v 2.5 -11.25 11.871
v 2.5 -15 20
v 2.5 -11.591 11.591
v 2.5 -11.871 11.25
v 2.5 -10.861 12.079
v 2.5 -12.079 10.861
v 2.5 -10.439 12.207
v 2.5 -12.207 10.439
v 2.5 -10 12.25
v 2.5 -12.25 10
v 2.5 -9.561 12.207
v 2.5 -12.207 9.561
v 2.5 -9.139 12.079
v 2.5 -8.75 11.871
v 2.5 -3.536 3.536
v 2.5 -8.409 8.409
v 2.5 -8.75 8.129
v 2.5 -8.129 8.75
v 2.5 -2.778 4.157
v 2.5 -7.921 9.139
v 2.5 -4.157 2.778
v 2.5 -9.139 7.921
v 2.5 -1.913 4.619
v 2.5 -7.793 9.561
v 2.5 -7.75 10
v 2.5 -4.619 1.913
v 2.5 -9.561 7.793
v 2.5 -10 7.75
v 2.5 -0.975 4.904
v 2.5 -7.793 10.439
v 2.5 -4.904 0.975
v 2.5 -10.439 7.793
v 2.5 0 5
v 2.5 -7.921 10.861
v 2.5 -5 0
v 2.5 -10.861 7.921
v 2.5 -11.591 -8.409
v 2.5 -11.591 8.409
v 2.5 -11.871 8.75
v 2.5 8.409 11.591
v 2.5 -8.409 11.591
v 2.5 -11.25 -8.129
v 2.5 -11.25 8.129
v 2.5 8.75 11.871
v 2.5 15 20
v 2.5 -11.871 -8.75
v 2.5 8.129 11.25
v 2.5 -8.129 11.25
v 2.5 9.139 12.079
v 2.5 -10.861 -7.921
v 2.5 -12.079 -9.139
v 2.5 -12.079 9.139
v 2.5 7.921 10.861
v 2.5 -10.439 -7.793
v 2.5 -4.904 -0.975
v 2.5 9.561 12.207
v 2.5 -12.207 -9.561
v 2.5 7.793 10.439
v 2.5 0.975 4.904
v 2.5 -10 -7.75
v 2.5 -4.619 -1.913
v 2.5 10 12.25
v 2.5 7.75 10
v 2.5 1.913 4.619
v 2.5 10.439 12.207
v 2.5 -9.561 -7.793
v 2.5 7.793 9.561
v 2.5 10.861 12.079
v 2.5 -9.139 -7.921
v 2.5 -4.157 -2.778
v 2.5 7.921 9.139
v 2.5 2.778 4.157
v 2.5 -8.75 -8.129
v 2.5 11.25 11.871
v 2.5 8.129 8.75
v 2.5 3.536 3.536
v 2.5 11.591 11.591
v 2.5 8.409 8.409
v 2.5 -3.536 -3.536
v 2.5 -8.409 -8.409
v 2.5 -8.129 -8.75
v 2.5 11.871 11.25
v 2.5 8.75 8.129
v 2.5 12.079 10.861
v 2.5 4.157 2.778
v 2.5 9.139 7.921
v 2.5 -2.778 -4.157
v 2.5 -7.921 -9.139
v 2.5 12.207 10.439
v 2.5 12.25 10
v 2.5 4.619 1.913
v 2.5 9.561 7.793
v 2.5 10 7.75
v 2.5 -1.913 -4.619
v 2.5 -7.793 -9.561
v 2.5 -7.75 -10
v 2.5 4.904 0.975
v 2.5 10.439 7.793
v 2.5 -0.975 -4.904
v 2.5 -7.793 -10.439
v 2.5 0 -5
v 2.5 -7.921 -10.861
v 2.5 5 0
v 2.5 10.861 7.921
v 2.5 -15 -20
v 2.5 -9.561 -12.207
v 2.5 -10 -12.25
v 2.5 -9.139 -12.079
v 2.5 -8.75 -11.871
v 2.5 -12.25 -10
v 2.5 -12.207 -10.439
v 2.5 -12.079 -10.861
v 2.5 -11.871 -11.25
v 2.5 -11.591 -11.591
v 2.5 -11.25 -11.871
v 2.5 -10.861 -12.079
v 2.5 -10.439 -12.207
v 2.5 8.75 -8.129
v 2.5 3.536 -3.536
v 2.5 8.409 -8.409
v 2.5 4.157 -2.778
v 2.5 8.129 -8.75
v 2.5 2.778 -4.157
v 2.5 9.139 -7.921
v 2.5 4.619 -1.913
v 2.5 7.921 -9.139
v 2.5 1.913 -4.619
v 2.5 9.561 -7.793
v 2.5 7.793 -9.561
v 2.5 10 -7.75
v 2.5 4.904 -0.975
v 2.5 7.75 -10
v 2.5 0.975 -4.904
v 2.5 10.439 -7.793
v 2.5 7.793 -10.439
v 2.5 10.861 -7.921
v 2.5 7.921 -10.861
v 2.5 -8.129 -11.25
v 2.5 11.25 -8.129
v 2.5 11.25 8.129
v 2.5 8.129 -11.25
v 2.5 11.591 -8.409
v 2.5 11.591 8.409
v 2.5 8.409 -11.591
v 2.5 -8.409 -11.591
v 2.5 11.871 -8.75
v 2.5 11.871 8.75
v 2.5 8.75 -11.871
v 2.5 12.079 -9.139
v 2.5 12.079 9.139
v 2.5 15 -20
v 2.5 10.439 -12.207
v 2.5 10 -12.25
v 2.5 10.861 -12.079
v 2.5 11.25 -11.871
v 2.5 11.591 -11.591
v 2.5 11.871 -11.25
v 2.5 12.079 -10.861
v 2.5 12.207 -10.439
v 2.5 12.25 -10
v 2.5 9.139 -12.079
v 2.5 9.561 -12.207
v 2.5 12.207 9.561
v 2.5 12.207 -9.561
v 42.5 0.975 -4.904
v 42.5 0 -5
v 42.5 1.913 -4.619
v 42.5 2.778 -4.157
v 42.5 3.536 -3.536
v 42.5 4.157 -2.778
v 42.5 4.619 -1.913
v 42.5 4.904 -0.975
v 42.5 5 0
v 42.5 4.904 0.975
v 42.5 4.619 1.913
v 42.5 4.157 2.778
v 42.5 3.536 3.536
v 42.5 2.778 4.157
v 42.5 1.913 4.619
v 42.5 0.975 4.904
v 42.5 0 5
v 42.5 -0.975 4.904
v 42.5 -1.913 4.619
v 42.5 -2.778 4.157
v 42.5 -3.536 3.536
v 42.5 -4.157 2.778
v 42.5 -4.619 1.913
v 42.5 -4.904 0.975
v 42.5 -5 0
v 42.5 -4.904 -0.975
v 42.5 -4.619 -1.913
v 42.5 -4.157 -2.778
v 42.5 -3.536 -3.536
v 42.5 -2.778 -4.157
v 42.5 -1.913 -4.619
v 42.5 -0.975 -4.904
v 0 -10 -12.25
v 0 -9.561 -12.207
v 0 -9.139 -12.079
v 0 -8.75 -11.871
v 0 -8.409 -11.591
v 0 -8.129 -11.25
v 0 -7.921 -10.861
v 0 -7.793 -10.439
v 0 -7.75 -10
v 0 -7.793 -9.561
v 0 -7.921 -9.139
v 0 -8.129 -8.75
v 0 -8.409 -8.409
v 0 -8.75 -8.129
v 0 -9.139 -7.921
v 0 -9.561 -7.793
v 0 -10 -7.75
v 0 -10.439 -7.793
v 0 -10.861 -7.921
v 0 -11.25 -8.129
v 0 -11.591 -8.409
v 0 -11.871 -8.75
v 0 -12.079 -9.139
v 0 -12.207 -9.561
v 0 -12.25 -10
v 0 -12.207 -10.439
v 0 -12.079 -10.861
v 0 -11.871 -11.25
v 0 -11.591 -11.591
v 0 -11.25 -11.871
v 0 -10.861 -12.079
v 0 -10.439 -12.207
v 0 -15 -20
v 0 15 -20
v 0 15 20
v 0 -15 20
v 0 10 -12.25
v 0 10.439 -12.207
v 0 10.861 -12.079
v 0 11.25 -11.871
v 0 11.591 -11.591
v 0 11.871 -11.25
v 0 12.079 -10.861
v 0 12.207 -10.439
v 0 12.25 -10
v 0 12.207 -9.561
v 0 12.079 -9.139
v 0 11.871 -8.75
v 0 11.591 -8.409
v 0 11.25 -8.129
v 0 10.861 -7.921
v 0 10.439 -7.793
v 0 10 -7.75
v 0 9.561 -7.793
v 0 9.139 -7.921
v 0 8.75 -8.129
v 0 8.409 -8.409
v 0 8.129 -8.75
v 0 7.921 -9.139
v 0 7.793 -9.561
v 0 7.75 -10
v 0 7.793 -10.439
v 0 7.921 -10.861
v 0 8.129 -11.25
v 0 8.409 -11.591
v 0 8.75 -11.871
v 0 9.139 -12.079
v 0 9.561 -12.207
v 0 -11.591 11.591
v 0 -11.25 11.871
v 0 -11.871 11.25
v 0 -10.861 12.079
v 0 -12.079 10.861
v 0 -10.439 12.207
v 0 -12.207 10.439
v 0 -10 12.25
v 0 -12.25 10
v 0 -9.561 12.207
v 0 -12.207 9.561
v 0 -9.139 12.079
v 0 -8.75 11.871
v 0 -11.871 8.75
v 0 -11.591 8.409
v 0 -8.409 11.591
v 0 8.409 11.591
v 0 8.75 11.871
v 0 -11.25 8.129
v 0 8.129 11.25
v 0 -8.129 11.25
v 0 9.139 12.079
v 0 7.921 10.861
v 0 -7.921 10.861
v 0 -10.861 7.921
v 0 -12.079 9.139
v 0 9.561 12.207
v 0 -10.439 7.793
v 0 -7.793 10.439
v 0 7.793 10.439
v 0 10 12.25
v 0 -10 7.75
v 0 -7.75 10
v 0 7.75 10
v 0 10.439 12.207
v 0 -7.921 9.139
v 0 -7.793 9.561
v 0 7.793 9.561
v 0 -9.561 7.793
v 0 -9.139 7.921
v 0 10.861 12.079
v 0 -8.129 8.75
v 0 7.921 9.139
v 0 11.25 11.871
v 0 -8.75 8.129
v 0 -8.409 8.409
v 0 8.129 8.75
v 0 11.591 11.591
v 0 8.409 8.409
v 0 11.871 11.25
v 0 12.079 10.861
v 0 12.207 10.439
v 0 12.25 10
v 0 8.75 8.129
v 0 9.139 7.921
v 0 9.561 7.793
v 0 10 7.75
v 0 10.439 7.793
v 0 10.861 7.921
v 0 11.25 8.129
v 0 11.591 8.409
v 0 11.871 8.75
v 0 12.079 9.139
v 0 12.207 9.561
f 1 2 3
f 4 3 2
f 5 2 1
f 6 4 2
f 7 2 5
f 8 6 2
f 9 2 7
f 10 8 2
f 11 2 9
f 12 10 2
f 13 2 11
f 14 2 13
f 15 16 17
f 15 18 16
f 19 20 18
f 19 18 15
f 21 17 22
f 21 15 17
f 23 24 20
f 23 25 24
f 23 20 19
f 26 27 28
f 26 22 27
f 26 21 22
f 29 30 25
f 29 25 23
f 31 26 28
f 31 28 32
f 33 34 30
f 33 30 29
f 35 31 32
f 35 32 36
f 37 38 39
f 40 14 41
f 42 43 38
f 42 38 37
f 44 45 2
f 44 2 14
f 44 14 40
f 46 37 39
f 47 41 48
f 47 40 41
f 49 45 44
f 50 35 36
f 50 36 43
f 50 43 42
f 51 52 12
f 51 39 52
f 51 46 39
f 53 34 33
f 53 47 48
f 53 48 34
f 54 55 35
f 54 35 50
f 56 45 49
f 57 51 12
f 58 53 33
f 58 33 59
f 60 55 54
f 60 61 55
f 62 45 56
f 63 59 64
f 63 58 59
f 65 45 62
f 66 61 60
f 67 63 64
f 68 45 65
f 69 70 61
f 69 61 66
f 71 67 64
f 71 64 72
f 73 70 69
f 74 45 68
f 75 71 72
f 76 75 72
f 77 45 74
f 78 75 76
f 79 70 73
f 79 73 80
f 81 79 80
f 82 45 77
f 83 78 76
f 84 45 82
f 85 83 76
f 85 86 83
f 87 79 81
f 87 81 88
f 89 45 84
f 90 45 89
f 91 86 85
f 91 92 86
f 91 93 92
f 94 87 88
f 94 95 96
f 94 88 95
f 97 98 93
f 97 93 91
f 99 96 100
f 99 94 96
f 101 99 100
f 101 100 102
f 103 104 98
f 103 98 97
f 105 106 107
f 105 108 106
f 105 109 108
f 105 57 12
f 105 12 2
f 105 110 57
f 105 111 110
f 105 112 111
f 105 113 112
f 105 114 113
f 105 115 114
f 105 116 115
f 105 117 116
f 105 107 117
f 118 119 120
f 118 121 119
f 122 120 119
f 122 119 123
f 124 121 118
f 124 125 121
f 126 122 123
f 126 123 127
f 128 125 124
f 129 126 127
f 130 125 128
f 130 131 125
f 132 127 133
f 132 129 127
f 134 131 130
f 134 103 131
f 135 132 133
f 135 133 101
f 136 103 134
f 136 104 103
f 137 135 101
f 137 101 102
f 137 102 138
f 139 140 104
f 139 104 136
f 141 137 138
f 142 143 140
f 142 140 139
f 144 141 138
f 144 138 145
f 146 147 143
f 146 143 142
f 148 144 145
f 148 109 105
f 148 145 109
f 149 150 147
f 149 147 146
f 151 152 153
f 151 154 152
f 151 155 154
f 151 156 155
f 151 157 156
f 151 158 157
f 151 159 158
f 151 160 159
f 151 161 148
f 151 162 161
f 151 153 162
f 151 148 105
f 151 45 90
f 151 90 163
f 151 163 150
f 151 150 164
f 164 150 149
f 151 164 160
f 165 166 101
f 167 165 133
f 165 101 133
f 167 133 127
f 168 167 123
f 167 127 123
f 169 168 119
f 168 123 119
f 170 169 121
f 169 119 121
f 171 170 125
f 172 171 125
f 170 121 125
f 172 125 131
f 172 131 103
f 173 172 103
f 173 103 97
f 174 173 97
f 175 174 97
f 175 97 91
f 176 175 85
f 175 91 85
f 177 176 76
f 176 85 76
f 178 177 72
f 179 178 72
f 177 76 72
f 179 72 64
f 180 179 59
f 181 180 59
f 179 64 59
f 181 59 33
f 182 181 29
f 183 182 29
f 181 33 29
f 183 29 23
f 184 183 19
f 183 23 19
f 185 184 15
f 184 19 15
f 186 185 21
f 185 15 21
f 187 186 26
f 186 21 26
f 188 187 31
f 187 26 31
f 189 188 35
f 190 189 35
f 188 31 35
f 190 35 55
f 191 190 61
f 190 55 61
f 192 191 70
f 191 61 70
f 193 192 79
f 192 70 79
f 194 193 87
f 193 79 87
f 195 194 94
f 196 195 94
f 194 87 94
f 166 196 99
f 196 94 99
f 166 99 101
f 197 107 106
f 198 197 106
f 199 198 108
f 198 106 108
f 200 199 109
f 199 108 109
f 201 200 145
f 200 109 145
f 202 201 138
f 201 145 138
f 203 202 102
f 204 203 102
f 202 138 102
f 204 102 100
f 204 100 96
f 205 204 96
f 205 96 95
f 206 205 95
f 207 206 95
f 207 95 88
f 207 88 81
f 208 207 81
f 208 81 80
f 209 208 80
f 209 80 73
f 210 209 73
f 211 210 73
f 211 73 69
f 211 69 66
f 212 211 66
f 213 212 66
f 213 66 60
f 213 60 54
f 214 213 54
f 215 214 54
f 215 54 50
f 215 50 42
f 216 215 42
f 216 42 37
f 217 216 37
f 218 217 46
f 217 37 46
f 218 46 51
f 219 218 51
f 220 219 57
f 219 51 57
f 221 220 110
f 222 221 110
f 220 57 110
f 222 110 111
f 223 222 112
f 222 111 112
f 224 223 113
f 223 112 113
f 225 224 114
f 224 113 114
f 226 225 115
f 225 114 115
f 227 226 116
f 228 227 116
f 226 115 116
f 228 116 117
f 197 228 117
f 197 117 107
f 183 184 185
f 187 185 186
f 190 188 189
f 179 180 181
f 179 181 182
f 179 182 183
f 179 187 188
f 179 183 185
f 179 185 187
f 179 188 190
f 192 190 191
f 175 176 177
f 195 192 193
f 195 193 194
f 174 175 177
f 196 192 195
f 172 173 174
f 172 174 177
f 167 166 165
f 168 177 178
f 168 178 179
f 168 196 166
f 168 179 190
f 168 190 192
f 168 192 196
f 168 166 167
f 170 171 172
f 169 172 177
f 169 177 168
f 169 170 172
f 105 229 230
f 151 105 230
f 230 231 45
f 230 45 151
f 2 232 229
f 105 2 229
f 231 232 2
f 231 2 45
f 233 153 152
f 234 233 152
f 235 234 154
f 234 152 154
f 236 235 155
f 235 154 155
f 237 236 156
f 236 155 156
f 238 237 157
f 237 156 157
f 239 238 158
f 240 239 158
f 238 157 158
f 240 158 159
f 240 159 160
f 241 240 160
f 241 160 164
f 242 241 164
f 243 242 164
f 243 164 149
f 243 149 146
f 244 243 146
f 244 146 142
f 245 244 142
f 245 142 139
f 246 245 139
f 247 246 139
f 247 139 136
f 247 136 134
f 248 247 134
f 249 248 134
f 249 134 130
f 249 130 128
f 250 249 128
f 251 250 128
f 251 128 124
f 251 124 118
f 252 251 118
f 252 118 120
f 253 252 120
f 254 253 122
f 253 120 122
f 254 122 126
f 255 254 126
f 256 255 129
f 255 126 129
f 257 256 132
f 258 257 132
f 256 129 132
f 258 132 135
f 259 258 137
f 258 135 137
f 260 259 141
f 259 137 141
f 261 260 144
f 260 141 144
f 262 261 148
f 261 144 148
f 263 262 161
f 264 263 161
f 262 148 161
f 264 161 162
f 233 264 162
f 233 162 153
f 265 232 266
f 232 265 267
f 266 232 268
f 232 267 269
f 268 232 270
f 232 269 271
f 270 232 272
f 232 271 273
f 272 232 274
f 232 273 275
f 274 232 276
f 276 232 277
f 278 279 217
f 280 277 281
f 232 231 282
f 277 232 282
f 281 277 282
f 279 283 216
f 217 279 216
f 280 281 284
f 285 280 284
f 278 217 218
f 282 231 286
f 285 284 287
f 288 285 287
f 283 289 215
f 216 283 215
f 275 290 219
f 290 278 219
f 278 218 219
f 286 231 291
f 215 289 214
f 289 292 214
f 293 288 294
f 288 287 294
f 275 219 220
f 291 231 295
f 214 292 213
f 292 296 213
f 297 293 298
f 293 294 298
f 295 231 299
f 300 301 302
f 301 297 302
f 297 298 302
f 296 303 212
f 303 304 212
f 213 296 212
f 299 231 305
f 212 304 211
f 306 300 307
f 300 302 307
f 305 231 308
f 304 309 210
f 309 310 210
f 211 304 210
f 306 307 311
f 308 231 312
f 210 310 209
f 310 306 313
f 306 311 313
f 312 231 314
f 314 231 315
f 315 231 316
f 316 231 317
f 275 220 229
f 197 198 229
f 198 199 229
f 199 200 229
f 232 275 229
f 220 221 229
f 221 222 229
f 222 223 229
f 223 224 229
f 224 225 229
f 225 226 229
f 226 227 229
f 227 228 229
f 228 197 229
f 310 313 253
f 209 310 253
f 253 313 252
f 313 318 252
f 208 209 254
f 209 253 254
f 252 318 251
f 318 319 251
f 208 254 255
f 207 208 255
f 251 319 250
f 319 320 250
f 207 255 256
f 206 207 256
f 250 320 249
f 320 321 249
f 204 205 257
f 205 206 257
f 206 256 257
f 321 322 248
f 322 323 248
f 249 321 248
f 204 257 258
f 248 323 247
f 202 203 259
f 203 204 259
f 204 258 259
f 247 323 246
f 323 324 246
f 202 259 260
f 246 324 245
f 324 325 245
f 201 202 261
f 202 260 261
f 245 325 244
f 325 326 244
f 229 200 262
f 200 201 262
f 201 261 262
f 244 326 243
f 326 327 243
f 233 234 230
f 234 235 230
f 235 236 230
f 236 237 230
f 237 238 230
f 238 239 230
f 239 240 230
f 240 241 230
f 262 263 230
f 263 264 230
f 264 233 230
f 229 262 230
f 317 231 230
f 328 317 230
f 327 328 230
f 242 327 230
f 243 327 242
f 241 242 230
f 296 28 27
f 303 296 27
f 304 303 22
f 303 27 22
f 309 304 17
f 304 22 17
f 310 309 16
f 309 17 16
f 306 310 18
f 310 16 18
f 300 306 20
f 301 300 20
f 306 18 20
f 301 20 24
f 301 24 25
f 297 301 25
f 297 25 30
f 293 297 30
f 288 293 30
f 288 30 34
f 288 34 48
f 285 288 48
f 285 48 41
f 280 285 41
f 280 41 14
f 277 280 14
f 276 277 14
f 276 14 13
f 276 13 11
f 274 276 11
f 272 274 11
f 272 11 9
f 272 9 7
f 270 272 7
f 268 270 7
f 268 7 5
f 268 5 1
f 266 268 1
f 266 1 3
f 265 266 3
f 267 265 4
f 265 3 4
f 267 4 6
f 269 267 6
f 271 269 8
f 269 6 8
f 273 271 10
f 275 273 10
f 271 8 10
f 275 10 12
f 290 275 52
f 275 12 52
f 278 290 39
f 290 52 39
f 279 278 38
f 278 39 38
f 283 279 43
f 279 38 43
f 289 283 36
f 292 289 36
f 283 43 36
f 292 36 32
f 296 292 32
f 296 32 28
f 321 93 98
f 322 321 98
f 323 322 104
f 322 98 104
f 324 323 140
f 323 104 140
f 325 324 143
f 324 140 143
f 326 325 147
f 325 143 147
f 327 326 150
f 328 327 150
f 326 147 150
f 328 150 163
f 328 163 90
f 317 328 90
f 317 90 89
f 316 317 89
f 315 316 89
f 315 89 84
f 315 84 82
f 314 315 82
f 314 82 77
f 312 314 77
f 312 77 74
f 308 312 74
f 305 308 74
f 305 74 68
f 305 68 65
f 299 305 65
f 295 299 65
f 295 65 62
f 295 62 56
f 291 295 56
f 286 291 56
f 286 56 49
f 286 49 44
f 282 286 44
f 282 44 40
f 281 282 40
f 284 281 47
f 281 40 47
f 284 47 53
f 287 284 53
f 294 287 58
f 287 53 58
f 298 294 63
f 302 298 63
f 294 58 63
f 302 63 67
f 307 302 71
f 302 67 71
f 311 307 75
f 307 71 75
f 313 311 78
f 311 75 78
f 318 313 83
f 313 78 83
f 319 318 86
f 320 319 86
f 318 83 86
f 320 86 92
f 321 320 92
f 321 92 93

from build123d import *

# Parameters (mm, degrees)
SKETCH1_W           = 40
SKETCH1_H           = 30
BOSS_EXTRUDE1_DEPTH = 2.5
SKETCH2_R           = 5
BOSS_EXTRUDE2_DEPTH = 40
SKETCH4_R           = 2.25
CUT_EXTRUDE1_DEPTH  = 48.16990566


with BuildPart() as part:
    # Sketch1 → Boss-Extrude1 (new body)
    with BuildSketch(Plane(origin=(0, 0, 0), x_dir=(0, 0, -1), z_dir=(1, 0, 0))):
        Rectangle(SKETCH1_W, SKETCH1_H)
    extrude(amount=BOSS_EXTRUDE1_DEPTH)

    # Sketch2 → Boss-Extrude2 (add)
    with BuildSketch(Plane(origin=(2.5, 0, 0), x_dir=(0, 0, -1), z_dir=(1, 0, 0))):
        Circle(SKETCH2_R)
    extrude(amount=BOSS_EXTRUDE2_DEPTH)

    # Sketch4 → Cut-Extrude1 (cut, through all)
    with BuildSketch(Plane(origin=(2.5, 0, 0), x_dir=(0, 0, -1), z_dir=(1, 0, 0))):
        with Locations((-10, 10)):
            Circle(SKETCH4_R)
        with Locations((-10, -10)):
            Circle(SKETCH4_R)
        with Locations((10, 10)):
            Circle(SKETCH4_R)
        with Locations((10, -10)):
            Circle(SKETCH4_R)
    extrude(amount=-CUT_EXTRUDE1_DEPTH, mode=Mode.SUBTRACT)


solid = part.part
